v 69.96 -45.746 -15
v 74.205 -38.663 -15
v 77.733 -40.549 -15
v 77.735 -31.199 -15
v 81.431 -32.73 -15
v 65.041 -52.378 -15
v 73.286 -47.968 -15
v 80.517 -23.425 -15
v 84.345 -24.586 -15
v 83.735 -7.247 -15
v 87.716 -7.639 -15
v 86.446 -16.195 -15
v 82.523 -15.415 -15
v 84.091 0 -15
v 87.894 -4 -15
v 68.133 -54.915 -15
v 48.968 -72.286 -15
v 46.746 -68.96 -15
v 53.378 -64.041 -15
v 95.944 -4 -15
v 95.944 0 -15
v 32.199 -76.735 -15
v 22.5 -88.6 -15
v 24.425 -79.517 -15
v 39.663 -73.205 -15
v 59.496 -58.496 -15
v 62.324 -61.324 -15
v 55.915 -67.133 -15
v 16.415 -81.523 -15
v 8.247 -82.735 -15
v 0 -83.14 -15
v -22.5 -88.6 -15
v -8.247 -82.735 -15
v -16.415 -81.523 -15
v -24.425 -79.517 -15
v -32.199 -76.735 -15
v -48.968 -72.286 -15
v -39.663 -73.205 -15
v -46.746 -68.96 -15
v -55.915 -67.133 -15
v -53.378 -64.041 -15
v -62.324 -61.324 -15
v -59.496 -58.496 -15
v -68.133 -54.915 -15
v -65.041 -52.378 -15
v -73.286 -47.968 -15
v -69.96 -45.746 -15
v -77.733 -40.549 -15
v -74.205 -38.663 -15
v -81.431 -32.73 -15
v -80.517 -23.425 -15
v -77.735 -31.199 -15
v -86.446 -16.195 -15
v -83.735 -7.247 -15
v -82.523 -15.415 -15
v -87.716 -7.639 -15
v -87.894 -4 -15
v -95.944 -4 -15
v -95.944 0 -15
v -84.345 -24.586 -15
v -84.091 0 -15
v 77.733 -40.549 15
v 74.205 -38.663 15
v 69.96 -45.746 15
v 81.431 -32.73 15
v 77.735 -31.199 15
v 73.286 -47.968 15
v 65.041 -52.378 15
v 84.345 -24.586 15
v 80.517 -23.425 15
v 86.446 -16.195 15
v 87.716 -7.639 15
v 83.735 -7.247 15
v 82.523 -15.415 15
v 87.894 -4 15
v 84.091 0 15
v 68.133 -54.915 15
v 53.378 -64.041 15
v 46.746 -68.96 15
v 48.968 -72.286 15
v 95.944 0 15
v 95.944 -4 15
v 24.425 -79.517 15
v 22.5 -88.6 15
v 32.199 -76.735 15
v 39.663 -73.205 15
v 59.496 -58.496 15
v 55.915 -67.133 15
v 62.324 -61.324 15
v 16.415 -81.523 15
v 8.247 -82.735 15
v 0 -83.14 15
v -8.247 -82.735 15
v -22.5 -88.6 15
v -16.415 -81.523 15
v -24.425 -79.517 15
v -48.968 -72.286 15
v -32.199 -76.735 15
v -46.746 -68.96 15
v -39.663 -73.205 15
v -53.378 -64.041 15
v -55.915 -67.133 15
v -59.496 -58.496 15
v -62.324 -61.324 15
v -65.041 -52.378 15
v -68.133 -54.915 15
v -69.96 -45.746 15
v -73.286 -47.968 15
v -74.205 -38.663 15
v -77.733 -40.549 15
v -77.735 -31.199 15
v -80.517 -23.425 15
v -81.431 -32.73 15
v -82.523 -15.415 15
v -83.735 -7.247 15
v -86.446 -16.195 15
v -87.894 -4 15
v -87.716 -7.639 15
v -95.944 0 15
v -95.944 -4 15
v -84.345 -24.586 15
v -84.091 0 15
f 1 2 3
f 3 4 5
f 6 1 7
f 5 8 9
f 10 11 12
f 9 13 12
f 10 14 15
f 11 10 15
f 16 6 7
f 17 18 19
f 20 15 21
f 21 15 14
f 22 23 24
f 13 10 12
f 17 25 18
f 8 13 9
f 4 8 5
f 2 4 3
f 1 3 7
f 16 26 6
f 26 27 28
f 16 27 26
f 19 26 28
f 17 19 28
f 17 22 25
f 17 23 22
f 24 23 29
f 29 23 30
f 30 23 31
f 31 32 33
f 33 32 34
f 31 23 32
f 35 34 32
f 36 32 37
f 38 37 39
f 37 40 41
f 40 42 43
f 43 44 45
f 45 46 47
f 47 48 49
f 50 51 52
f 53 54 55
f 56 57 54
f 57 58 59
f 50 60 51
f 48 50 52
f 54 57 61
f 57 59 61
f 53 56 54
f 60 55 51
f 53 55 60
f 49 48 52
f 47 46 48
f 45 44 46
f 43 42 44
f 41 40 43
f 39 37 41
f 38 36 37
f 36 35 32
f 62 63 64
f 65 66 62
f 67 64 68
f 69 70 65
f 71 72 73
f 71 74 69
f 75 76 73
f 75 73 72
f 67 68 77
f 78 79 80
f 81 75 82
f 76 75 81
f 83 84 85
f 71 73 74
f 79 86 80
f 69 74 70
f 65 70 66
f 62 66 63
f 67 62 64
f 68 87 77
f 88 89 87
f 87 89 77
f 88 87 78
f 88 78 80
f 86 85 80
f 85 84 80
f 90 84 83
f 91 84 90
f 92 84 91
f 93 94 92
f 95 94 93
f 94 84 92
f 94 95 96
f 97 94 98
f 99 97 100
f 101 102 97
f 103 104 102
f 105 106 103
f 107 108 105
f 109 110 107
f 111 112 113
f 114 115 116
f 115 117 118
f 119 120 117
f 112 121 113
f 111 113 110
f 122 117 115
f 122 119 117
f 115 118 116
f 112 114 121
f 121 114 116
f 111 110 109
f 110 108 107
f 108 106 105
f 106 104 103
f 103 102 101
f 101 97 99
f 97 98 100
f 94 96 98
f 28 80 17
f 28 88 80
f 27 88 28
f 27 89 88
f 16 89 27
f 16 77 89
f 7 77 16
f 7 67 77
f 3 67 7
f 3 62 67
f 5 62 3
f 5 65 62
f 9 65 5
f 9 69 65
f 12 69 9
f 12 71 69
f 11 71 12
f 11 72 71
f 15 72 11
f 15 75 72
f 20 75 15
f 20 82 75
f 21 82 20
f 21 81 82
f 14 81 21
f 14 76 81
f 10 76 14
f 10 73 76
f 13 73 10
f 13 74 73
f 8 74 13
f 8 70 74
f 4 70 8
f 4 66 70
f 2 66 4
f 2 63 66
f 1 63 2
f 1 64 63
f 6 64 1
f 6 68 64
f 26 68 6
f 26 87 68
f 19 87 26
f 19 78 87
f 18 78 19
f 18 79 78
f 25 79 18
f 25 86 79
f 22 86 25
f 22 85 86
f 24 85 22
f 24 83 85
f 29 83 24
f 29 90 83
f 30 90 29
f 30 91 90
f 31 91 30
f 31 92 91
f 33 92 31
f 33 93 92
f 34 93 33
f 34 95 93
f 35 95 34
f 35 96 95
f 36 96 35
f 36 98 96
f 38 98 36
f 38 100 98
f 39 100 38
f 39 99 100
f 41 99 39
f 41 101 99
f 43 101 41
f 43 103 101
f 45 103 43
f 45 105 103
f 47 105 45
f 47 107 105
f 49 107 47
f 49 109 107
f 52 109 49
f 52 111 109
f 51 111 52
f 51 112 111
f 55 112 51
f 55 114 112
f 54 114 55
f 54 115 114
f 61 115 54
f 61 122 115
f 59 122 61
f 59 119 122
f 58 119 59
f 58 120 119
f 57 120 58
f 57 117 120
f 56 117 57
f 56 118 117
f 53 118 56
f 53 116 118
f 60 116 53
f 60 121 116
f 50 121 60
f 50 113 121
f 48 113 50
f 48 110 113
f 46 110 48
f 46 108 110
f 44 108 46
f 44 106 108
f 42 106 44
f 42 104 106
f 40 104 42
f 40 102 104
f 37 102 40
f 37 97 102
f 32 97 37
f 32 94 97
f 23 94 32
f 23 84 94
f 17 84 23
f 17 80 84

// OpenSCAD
// file: clamp.scad
// Flange Clamp for the Blue Robotics Watertight Enclosure
//
// This document is a parametric design that does not include dimensions.
// Please use one of the accompanying files, e.g., enclosure-clamp-3in.scad.
//
// Based on the WTE3-M-CLAMP-R1 model by Blue Robotics:
// https://bluerobotics.com/store/watertight-enclosures/enclosure-clamp/
//
// OpenSCAD model by Ryan Govostes.
// License: CC BY 4.0 (https://creativecommons.org/licenses/by/4.0/)


fillet_radius = 1.00;


$fn = 64;


translate([0, 0, -(height/2)])
linear_extrude(height) {
    difference() {
        union() {
            hull() {
                translate([0, circle_y_offset])
                circle(r=(radius + thickness));

                translate([-(base_width/2), -depth])
                square(size=[base_width, 1]);
            }

            translate([-(width/2), -thickness])
            square([width, thickness]);
        }

        translate([0, circle_y_offset])
        circle(r=radius);

        // Cut off the top half of the shape
        translate([-200, 0])
        square([400, 400]);
    }
}

// TODO: Flange fillets
// TODO: Mounting and flange holes
// main file
// Flange Clamp for the Blue Robotics Watertight Enclosure, 6" series
//
// Based on the WTE4-M-CLAMP-R1 model by Blue Robotics:
// https://bluerobotics.com/store/watertight-enclosures/enclosure-clamp/
//
// OpenSCAD model by Ryan Govostes.
// License: CC BY 4.0 (https://creativecommons.org/licenses/by/4.0/)

// Note: Blue Robotics does not provide clamps for their 6" series enclosures.
// The dimensions below are extrapolated from their other clamps, but are not
// guaranteed to be accurate.

tube_od = 165.10;
tape_thickness = 1.59;  // 1/16"
radius = tube_od/2 + tape_thickness;

thickness = 4.00;
height = 30.00;

// Flange measurements same as 4" series
flange_width = 11.81;
flange_hole_diameter = 2.50;  // M3x12

// Base measurements same as 4" series
base_width = 45.00;
base_hole_diameter = 3.30;  // M4x14
base_hole_depth = 5.50;

// Center the circle 1.00 mm above the X axis, like the 4" model
circle_y_offset = 1.00;

// Calculate the width of the mouth taking into account the off-center circle,
// then calculate the overall width.
mouth_width = 2*sqrt(pow(radius, 2) - pow(circle_y_offset, 2));
width = mouth_width + 2*flange_width;

// Depth is slightly greater than having the base be tangent to the rim.
// The offset below is from the 4" series; the 3" series is 1mm less.
depth = (radius - circle_y_offset) + thickness + 1.46;


include <clamp.scad>;
